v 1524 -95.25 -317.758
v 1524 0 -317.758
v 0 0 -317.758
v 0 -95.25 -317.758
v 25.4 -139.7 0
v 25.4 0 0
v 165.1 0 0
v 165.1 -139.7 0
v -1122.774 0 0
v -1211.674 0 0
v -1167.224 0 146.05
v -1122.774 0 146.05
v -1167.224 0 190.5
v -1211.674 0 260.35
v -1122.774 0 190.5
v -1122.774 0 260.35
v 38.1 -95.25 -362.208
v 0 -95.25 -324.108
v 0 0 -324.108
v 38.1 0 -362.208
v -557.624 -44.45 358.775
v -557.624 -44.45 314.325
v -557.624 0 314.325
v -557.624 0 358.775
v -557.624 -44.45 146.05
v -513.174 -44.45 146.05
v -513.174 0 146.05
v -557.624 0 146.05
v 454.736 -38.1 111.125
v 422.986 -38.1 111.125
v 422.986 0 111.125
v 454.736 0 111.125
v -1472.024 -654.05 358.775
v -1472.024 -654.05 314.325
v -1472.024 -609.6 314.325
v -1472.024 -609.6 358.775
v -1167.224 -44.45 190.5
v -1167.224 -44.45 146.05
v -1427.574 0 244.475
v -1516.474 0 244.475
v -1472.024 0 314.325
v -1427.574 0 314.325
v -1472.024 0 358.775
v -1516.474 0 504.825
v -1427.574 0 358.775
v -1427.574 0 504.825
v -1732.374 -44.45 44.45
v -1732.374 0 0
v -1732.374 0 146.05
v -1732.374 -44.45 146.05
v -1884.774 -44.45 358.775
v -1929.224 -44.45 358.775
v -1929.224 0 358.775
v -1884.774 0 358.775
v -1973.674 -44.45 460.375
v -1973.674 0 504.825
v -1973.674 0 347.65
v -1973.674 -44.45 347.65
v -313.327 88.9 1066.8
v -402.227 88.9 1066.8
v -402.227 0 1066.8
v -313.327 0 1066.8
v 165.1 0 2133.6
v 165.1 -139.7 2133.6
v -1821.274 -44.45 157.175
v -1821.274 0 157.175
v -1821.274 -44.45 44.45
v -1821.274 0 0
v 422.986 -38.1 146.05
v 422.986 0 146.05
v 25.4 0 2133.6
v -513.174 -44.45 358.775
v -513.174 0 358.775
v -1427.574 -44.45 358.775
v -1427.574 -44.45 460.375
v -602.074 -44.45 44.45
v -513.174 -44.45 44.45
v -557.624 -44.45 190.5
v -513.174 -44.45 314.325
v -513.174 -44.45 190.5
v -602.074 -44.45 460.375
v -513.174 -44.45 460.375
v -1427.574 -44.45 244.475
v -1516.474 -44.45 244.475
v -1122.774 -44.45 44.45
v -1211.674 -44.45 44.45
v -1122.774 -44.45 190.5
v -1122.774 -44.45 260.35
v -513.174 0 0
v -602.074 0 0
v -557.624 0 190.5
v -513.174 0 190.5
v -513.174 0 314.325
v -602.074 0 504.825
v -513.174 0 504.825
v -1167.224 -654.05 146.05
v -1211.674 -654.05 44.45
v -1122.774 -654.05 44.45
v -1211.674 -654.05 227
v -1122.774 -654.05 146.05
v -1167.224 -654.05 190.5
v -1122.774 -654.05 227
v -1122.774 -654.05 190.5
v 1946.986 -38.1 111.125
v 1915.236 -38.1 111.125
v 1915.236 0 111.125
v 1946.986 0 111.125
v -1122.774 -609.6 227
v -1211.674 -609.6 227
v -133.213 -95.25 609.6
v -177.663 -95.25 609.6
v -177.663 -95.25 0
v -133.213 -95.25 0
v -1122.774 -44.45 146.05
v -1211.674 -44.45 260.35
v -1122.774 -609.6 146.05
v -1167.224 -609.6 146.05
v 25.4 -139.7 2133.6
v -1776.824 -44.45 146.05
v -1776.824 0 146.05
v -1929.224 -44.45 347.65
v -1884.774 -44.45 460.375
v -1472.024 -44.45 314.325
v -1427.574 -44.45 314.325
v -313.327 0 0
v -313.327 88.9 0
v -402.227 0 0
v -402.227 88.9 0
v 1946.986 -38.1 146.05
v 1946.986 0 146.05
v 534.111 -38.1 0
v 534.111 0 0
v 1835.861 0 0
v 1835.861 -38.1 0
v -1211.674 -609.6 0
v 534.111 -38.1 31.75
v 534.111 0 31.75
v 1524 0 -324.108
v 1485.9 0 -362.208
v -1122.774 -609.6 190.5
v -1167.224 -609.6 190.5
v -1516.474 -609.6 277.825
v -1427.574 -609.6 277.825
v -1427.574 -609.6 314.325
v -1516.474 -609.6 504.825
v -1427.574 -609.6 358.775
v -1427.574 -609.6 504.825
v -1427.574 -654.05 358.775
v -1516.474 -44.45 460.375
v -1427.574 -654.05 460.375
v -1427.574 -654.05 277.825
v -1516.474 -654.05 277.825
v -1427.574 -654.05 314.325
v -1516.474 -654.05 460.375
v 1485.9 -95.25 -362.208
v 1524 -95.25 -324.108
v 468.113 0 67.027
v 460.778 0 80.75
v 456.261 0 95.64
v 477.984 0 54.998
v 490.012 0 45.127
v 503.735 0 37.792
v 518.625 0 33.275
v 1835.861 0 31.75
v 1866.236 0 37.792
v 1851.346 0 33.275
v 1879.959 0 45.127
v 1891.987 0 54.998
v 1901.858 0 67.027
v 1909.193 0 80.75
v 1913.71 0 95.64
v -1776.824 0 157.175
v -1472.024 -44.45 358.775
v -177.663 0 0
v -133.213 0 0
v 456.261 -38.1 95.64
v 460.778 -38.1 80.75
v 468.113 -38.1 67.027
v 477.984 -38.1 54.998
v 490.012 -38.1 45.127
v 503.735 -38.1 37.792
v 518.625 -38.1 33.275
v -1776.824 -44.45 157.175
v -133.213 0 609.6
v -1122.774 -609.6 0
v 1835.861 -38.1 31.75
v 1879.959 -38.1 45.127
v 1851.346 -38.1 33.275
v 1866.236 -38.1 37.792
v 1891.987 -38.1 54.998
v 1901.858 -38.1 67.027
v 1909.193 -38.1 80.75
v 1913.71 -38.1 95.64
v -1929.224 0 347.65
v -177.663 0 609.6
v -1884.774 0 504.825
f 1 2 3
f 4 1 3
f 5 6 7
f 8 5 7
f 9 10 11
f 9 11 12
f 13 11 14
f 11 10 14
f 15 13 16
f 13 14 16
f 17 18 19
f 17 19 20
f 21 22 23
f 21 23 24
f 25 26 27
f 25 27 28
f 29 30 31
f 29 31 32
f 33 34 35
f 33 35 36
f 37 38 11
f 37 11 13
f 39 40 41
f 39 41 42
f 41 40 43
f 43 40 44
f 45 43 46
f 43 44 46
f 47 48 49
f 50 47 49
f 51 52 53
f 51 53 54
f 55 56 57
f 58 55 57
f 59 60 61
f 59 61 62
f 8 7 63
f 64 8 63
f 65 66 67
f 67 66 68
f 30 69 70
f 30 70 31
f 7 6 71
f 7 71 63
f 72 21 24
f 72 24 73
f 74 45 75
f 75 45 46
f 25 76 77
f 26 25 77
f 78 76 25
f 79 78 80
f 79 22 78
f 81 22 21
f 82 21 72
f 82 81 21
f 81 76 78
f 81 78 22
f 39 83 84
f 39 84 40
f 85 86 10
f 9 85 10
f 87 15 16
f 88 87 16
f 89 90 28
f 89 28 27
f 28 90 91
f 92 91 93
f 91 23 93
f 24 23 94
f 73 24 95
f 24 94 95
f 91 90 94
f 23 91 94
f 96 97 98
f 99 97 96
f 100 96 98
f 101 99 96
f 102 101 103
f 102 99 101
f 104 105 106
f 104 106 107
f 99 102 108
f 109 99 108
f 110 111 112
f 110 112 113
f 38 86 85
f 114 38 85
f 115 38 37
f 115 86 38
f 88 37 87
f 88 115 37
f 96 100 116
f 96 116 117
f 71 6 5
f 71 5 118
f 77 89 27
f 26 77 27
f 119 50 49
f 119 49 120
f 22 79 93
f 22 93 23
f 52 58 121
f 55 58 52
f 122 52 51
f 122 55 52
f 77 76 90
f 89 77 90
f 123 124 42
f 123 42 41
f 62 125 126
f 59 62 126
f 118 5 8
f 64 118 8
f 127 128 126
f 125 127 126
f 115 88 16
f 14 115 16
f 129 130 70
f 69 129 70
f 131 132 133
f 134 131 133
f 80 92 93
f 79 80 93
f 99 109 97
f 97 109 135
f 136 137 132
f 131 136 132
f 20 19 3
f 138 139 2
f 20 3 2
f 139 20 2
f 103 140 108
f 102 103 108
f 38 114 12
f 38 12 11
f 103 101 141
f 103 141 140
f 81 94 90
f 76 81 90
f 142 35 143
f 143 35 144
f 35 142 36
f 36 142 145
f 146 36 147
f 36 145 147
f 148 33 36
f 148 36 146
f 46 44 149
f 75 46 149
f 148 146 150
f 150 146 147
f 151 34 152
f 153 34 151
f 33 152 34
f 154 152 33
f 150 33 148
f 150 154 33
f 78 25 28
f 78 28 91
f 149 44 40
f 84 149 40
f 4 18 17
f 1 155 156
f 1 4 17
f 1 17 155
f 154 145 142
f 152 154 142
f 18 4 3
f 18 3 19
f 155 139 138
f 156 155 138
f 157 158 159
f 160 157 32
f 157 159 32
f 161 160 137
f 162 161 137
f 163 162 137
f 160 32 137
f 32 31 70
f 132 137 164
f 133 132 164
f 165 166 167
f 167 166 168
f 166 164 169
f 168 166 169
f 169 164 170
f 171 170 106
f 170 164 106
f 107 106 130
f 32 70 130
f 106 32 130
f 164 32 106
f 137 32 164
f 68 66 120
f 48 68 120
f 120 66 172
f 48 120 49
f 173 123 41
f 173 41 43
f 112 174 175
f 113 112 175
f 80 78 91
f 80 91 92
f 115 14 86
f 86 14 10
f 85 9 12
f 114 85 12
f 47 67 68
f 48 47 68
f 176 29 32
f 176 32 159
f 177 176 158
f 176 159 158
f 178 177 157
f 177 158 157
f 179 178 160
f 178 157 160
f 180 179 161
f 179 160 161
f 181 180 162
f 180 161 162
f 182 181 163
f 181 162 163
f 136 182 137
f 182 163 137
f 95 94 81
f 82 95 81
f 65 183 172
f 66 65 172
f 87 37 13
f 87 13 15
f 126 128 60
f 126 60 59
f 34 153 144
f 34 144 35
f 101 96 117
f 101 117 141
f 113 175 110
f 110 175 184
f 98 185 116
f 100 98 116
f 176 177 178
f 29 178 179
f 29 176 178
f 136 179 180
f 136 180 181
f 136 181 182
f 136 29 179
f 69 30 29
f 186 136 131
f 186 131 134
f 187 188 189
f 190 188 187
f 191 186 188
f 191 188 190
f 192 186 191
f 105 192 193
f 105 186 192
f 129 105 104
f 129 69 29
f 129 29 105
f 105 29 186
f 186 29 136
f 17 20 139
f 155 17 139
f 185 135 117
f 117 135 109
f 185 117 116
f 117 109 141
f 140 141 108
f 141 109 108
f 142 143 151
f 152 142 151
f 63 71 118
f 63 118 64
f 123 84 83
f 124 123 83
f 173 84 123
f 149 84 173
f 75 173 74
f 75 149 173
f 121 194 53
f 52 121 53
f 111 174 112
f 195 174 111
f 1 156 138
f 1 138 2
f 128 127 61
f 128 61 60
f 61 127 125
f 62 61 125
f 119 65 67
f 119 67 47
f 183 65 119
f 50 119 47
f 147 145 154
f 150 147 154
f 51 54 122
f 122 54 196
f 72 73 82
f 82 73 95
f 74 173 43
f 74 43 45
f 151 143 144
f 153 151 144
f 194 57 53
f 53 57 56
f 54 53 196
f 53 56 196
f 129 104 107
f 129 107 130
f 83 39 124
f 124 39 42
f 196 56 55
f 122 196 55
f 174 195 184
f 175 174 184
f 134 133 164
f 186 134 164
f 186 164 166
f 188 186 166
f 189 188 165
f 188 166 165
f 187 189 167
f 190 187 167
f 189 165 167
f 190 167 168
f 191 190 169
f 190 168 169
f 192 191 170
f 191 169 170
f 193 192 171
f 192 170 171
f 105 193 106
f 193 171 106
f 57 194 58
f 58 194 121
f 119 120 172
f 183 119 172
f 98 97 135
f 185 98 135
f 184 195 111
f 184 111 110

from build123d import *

# Parameters (mm, degrees)
F0_W      = 139.7
F0_H      = 2133.6
F1_DEPTH  = 139.7
F3_DEPTH  = 38.1
F5_DEPTH  = 95.25
F6_W      = 88.9
F6_H      = 88.9
F7_DEPTH  = 1066.8
F8_W      = 44.45
F8_H      = 609.6
F9_DEPTH  = 95.25
F11_DEPTH = 44.45
F13_DEPTH = 88.9
F16_DEPTH = 101.6
F18_W     = 44.45
F18_H     = 242.5570257008
F18_H_2   = 53.975
F19_DEPTH = 101.6
F21_W     = 44.45
F21_H     = 190.5
F21_H_2   = 123.825
F21_H_3   = 33.3248
F22_DEPTH = 101.6
F24_W     = 44.45
F24_H     = 123.825
F25_DEPTH = 101.6
F27_W     = 44.45
F27_H     = 87.3252
F27_H_2   = 192.8097355843
F28_DEPTH = 101.6
F30_W     = 44.45
F30_H     = 87.3252
F31_DEPTH = 101.6


with BuildPart() as f1:
    # F0 (on Front) → F1 (new body)
    with BuildSketch(Plane.XZ):
        with Locations((95.25, 1066.8)):
            Rectangle(F0_W, F0_H)
    extrude(amount=F1_DEPTH)


with BuildPart() as f3:
    # F2 (on Front) → F3 (new body)
    with BuildSketch(Plane.XZ):
        with BuildLine():
            Line((534.11054703, 31.75), (534.11054703, 0))
            Line((534.11054703, 0), (1835.86054703, 0))
            Line((1835.86054703, 0), (1835.86054703, 31.75))
            ThreePointArc((1835.86054703, 31.75), (1891.9871477866, 54.9983992433), (1915.23554703, 111.125))
            Line((1915.23554703, 111.125), (1946.98554703, 111.125))
            Line((1946.98554703, 111.125), (1946.98554703, 146.05))
            Line((1946.98554703, 146.05), (422.98554703, 146.05))
            Line((422.98554703, 146.05), (422.98554703, 111.125))
            Line((422.98554703, 111.125), (454.73554703, 111.125))
            ThreePointArc((454.73554703, 111.125), (477.9839462733, 54.9983992433), (534.11054703, 31.75))
        make_face()
    extrude(amount=F3_DEPTH)


with BuildPart() as f5:
    # F4 (on Front) → F5 (new body)
    with BuildSketch(Plane.XZ):
        Polygon((1524, -317.7578675234), (0, -317.7578675234), (0, -324.1078675234), (38.1, -362.2078675234), (1485.9, -362.2078675234), (1524, -324.1078675234), align=None)
    extrude(amount=F5_DEPTH)


with BuildPart() as f7:
    # F6 (on Top) → F7 (new body)
    with BuildSketch(Plane.XY):
        with Locations((-357.7766300052, 44.45)):
            Rectangle(F6_W, F6_H)
    extrude(amount=F7_DEPTH)


with BuildPart() as f9:
    # F8 (on Front) → F9 (new body)
    with BuildSketch(Plane.XZ):
        with Locations((-155.4375765641, 304.8)):
            Rectangle(F8_W, F8_H)
    extrude(amount=F9_DEPTH)


with BuildPart() as f11:
    # F10 (on Front) → F11 (new body)
    with BuildSketch(Plane.XZ):
        Polygon((-602.0738712236, 504.825), (-602.0738712236, 0), (-513.1738712236, 0), (-513.1738712236, 146.05), (-557.6238712236, 146.05), (-557.6238712236, 190.5), (-513.1738712236, 190.5), (-513.1738712236, 314.325), (-557.6238712236, 314.325), (-557.6238712236, 358.775), (-513.1738712236, 358.775), (-513.1738712236, 504.825), align=None)
    extrude(amount=F11_DEPTH)

    # F12 (on face) → F13 (cut)
    with BuildSketch(Plane(origin=(-602.0738712236, 0, 0), x_dir=(0, -1, 0), z_dir=(-1, 0, 0))):
        Polygon((44.45, 504.825), (0, 504.825), (44.45, 460.375), align=None)
        Polygon((44.45, 44.45), (0, 0), (44.45, 0), align=None)
    extrude(amount=-F13_DEPTH, mode=Mode.SUBTRACT)


with BuildPart() as f14_1:
    # F14: copy of F11
    add(f11.part.moved(Location((-609.6, 0, 0))))

    # F15 (on face) → F16 (cut)
    with BuildSketch(Plane.YZ.offset(-1122.7738712236)):
        Polygon((-45.72, 260.35), (0, 260.35), (0, 358.775), (-44.45, 358.775), (-44.45, 460.375), (0, 504.825), (0, 768.35), (-45.72, 768.35), align=None)
        Polygon((-44.45, 358.775), (0, 358.775), (0, 504.825), (-44.45, 460.375), align=None)
    extrude(amount=-F16_DEPTH, mode=Mode.SUBTRACT)


with BuildPart() as f17_1:
    # F17: copy of F11
    add(f11.part.moved(Location((-914.4, 0, 0))))

    # F18 (on face) → F19 (cut)
    with BuildSketch(Plane.YZ.offset(-1427.5738712236)):
        with Locations((-22.225, 69.2214871496)):
            Rectangle(F18_W, F18_H)
        with Locations((-22.225, 217.4875)):
            Rectangle(F18_W, F18_H_2)
    extrude(amount=-F19_DEPTH, mode=Mode.SUBTRACT)


with BuildPart() as f20_1:
    # F20: copy of F11
    add(f11.part.moved(Location((-1219.2, 0, 0))))

    # F21 (on face) → F22 (cut)
    with BuildSketch(Plane.YZ.offset(-1732.3738712236)):
        with Locations((-22.225, 409.575)):
            Rectangle(F21_W, F21_H)
        with Locations((-22.225, 252.4125)):
            Rectangle(F21_W, F21_H_2)
        with Locations((-22.225, 173.8376)):
            Rectangle(F21_W, F21_H_3)
    extrude(amount=-F22_DEPTH, mode=Mode.SUBTRACT)


with BuildPart() as f23_1:
    # F23: copy of F11
    add(f11.part.moved(Location((-1371.6, 0, 0))))

    # F24 (on face) → F25 (cut)
    with BuildSketch(Plane.YZ.offset(-1884.7738712236)):
        Polygon((-51.1882424594, 0), (0, 0), (0, 190.5), (-44.45, 190.5), (-44.45, 314.325), (0, 314.325), (0, 347.6498), (-51.1882424594, 347.6498), align=None)
        with Locations((-22.225, 252.4125)):
            Rectangle(F24_W, F24_H)
    extrude(amount=-F25_DEPTH, mode=Mode.SUBTRACT)


with BuildPart() as f26_1:
    # F26: copy of F11
    add(f11.part.moved(Location((-609.6, -609.6, 0))))

    # F27 (on face) → F28 (cut)
    with BuildSketch(Plane.YZ.offset(-1122.7738712236)):
        with Locations((-631.825, 270.6624)):
            Rectangle(F27_W, F27_H)
        with Locations((-631.825, 410.7298677921)):
            Rectangle(F27_W, F27_H_2)
    extrude(amount=-F28_DEPTH, mode=Mode.SUBTRACT)


with BuildPart() as f29_1:
    # F29: copy of F11
    add(f11.part.moved(Location((-914.4, -609.6, 0))))

    # F30 (on face) → F31 (cut)
    with BuildSketch(Plane.YZ.offset(-1427.5738712236)):
        Polygon((-654.05, 0), (-609.5743775368, 0), (-609.5743775368, 277.8252), (-609.6, 277.8252), (-609.6, 190.5), (-654.05, 190.5), align=None)
        with Locations((-631.825, 234.1626)):
            Rectangle(F30_W, F30_H)
    extrude(amount=-F31_DEPTH, mode=Mode.SUBTRACT)


solid = Compound([f1.part, f3.part, f5.part, f7.part, f9.part, f11.part, f14_1.part, f17_1.part, f20_1.part, f23_1.part, f26_1.part, f29_1.part])
